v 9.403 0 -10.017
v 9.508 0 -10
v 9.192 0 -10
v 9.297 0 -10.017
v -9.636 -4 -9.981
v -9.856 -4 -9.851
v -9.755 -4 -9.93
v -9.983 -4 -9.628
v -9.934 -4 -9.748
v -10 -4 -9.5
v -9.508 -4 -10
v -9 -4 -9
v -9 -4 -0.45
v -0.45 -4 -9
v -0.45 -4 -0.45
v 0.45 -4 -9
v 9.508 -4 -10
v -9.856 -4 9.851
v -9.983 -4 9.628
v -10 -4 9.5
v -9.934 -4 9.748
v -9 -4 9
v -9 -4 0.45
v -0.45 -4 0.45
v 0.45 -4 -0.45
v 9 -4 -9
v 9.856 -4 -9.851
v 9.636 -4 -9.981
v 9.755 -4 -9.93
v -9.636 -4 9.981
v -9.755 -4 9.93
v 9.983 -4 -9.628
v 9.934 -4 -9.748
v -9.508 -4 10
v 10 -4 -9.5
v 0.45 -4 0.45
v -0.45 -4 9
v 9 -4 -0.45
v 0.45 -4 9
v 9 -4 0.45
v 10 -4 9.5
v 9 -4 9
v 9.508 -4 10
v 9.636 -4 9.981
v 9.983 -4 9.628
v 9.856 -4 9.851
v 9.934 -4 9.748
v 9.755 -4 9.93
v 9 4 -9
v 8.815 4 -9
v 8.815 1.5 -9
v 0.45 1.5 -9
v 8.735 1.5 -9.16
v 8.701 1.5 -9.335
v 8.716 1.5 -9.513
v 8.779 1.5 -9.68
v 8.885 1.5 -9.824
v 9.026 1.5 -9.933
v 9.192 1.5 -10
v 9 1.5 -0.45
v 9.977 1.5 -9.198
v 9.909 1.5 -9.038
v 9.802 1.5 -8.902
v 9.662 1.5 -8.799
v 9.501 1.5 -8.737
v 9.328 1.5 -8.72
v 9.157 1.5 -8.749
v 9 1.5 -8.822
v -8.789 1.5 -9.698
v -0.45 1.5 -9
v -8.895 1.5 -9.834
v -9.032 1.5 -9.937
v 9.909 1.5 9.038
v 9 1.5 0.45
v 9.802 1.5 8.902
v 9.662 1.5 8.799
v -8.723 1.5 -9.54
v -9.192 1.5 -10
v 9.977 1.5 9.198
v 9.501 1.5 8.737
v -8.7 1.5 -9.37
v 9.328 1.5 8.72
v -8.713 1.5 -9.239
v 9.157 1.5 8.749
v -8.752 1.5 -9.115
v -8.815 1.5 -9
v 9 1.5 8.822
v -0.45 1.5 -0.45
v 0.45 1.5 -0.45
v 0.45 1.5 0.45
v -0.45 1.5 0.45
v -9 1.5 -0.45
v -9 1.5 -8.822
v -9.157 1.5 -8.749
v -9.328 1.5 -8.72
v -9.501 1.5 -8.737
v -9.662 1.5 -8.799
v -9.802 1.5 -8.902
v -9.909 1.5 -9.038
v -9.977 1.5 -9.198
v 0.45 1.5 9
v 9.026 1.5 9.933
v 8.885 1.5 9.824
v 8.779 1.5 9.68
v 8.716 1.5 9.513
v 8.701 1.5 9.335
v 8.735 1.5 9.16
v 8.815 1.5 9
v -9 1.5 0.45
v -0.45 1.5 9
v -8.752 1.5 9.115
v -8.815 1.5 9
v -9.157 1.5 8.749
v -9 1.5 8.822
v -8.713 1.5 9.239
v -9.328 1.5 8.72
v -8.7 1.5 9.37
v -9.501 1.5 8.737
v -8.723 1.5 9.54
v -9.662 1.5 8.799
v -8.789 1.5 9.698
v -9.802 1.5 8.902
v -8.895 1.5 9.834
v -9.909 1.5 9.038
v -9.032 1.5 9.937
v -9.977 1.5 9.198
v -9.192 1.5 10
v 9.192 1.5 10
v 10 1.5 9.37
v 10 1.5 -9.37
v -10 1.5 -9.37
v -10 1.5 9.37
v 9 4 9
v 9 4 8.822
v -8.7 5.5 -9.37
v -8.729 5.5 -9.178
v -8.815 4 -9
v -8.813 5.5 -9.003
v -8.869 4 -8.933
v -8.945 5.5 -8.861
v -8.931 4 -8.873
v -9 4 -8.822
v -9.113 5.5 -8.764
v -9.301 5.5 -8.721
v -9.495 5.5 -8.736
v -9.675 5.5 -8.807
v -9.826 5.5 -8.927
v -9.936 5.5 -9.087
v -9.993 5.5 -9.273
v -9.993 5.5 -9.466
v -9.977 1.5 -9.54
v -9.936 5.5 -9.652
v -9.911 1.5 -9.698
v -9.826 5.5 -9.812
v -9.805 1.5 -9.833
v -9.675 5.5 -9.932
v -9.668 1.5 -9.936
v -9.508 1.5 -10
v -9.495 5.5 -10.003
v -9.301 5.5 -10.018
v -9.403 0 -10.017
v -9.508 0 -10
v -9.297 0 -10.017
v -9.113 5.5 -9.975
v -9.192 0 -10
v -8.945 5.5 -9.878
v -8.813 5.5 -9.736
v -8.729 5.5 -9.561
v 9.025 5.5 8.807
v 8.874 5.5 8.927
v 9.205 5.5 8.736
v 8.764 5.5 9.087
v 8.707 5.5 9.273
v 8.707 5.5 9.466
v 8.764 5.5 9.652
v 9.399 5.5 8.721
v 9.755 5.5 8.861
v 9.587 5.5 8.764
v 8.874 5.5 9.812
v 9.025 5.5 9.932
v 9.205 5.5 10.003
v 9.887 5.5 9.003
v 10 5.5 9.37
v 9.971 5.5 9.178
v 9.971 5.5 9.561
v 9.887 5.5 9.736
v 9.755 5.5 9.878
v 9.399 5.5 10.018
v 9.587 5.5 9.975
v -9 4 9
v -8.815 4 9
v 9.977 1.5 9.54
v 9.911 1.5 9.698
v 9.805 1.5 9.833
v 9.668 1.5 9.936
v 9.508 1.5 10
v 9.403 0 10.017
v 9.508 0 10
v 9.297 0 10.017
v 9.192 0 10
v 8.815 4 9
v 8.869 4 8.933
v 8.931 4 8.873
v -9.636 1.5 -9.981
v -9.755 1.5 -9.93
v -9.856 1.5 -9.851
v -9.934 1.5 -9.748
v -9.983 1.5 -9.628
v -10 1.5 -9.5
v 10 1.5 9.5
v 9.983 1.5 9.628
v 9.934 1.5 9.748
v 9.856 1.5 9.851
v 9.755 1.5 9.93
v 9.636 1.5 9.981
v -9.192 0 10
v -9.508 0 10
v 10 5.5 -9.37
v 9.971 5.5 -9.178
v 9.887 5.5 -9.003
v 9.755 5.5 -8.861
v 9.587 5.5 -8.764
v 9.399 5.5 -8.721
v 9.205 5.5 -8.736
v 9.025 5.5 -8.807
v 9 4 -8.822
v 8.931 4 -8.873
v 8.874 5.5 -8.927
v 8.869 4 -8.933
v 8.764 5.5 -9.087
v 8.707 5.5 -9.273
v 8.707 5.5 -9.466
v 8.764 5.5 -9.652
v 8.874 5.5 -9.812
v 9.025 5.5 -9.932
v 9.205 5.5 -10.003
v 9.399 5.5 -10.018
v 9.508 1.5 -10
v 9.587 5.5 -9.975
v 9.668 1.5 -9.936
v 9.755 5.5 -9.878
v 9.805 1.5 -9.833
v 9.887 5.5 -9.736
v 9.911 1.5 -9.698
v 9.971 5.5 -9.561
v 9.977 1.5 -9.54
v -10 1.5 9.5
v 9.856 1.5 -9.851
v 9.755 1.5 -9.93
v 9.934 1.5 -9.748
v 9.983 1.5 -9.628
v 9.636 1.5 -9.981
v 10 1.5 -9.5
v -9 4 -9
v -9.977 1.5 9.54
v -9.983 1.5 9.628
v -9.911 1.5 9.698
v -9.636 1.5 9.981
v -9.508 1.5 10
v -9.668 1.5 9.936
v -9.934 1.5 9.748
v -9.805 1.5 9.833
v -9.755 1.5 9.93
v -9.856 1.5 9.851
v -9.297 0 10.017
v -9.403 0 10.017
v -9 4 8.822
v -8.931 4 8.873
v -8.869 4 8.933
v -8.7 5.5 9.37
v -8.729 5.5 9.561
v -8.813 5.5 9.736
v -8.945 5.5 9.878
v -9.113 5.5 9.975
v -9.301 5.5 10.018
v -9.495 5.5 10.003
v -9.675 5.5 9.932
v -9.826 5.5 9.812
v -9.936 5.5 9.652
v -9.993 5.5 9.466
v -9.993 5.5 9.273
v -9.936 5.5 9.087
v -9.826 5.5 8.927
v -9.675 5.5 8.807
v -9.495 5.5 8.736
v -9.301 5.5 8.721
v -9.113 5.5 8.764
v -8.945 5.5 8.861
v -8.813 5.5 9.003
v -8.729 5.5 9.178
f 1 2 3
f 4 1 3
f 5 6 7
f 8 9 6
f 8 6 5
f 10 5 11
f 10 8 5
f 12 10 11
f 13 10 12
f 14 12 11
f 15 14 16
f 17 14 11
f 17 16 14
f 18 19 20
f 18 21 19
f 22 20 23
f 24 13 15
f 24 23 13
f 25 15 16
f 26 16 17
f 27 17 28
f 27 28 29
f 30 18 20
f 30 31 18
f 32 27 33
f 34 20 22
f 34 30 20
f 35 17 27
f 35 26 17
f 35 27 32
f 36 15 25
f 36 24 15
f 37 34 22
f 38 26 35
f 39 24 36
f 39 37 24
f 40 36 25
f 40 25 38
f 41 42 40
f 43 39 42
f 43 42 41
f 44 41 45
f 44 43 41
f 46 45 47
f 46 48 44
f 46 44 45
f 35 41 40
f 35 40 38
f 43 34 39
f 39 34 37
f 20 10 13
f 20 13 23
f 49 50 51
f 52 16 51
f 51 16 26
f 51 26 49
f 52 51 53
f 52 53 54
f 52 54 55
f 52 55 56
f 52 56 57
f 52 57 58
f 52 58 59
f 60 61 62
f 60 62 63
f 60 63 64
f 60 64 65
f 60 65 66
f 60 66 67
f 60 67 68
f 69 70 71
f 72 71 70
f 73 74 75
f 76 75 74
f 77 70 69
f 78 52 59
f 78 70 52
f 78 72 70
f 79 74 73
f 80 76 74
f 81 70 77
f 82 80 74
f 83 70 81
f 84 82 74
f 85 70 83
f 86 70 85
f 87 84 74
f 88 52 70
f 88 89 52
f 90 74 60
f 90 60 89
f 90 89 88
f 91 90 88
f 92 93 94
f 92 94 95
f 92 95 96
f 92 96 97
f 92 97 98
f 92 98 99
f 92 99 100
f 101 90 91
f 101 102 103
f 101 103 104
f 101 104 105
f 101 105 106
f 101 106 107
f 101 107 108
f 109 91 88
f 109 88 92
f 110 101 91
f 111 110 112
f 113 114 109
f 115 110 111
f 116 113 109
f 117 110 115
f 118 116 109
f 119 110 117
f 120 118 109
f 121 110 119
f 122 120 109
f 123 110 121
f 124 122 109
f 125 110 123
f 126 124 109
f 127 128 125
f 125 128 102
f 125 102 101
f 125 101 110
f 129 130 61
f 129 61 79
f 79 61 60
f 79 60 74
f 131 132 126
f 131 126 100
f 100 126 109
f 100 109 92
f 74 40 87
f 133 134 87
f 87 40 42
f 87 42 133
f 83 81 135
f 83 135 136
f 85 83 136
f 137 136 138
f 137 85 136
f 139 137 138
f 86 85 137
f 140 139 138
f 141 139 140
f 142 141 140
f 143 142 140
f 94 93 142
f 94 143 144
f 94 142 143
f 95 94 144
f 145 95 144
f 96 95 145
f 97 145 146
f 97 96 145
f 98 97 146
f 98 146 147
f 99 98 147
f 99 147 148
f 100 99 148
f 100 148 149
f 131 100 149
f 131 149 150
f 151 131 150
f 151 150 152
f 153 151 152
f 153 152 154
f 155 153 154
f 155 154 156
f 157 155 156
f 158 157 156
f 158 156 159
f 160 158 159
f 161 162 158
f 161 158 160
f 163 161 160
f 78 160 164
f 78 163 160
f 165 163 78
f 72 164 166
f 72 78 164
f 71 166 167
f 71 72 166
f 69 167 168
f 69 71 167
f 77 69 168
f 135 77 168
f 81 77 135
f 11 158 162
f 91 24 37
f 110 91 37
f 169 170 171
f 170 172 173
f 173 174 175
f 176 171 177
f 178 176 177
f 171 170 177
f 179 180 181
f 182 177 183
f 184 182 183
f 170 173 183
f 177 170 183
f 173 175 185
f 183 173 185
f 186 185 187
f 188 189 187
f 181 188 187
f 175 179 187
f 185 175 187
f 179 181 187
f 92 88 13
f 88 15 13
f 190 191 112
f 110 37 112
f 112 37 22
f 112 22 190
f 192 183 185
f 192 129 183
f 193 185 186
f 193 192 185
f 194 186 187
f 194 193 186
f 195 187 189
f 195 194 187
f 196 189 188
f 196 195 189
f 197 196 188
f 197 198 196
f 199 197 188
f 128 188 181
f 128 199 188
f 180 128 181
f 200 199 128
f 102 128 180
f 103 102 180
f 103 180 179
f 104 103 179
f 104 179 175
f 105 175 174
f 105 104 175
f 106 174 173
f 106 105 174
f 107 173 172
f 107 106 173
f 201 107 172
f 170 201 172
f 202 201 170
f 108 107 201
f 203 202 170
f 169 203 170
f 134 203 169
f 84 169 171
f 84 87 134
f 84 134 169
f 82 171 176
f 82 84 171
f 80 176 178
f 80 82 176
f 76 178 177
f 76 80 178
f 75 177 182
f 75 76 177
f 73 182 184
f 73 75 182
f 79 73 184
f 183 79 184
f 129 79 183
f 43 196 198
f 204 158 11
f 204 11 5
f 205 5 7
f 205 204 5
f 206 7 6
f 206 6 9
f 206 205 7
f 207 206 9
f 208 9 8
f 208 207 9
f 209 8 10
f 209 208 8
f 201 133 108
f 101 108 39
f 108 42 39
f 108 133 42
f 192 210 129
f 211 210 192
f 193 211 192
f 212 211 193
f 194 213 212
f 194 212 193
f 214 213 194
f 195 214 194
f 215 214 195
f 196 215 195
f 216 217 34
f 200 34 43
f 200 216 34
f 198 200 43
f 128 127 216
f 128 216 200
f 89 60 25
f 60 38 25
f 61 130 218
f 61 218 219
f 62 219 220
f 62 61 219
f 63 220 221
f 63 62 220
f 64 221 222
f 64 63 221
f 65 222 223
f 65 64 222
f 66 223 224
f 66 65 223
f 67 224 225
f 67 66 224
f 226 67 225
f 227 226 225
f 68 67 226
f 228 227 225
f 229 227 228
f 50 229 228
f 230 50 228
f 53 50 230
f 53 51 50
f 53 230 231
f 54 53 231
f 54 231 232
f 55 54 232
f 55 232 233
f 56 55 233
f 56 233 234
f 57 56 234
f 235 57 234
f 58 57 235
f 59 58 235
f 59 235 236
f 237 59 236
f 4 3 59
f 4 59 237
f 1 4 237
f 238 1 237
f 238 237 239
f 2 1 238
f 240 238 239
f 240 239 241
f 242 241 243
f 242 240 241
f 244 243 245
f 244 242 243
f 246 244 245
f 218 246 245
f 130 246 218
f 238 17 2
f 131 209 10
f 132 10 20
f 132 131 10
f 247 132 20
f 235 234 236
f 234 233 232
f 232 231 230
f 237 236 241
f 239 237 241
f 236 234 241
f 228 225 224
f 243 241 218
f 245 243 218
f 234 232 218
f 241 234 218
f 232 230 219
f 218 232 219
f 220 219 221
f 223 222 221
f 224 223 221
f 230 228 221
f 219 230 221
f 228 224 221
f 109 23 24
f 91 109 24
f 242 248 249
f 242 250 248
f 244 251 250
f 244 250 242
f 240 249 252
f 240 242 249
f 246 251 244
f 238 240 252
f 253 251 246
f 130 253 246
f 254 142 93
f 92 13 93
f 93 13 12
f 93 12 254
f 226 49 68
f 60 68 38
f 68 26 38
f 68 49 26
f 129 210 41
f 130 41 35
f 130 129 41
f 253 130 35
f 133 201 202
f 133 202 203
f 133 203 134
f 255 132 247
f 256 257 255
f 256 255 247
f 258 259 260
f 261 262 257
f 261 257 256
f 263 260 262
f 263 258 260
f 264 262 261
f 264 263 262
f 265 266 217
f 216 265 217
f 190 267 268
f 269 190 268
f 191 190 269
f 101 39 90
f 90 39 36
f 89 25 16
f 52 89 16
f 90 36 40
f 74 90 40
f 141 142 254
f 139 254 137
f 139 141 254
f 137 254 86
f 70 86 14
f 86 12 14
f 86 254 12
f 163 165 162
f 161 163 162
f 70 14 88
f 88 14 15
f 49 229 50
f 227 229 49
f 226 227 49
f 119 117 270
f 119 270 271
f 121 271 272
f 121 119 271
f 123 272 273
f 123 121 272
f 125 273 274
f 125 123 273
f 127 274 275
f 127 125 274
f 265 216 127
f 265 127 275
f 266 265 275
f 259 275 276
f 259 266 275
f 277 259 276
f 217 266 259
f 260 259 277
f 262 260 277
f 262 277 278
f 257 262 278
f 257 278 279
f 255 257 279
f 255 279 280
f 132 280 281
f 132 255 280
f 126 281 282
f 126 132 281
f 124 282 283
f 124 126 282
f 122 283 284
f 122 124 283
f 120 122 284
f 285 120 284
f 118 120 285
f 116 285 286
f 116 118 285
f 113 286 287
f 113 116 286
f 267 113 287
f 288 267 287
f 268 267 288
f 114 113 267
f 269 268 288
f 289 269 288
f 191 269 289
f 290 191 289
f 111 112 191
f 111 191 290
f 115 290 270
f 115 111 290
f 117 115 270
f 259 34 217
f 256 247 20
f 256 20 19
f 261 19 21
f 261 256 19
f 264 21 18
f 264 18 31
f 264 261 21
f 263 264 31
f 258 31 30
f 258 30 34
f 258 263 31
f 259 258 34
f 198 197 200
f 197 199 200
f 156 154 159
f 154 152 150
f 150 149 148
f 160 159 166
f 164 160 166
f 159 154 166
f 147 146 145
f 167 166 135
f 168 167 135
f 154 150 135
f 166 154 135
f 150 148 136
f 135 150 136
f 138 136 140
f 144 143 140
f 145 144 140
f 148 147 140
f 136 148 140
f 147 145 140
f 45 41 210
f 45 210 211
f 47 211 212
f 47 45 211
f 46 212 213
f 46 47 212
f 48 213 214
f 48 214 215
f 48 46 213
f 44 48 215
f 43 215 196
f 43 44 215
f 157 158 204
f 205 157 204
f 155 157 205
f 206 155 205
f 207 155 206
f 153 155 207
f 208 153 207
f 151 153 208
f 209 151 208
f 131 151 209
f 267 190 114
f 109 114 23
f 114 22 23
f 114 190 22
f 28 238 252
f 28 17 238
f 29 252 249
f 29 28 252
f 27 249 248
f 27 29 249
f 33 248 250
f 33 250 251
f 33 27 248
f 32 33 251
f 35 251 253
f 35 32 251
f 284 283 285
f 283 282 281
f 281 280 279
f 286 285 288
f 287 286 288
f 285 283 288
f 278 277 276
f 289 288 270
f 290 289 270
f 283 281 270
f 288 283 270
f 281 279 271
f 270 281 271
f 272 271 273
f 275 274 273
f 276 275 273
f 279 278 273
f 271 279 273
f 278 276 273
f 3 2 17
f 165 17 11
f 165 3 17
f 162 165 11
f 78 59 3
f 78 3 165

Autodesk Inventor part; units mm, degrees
ref_plane "YZ Plane" through (0, 0, 0) normal (1, 0, 0) x (0, 1, 0)
ref_plane "XZ Plane" through (0, 0, 0) normal (0, 1, 0) x (-1, 0, 0)
ref_plane "XY Plane" through (0, 0, 0) normal (0, 0, 1) x (1, 0, 0)
sketch "Sketch1" plane through (0, 0, 0) normal (0, 1, 0) x (-1, 0, 0)
  line L0 (-9.35, 9.3695) -> (9.35, 9.3695) construction
  line L1 (9.35, 9.3695) -> (9.35, -9.3695) construction
  line L2 (9.35, -9.3695) -> (-9.35, -9.3695) construction
  line L3 (-9.35, -9.3695) -> (-9.35, 9.3695) construction
  line L4 (-9.35, 9.3695) -> (9.35, -9.3695) construction
  line L5 (9.35, 9.3695) -> (-9.35, -9.3695) construction
  line L6 (-10, 10) -> (10, 10)
  line L7 (10, 10) -> (10, -10)
  line L8 (10, -10) -> (-10, -10)
  line L9 (-10, -10) -> (-10, 10)
  line L10 (-10, 10) -> (10, -10) construction
  line L11 (10, 10) -> (-10, -10) construction
  point P0 (0, 0)
  dimension "d0" = 18.739
  dimension "d1" = 18.7
  dimension "d2" = 20
  dimension "d3" = 20
extrude "Extrusion1" add sketch "Sketch1" along normal blind 1.5
sketch "Sketch2" plane through (0, 0, 0) normal (0, -1, 0) x (1, 0, 0)
  line L0 (-9.35, 9.3695) -> (9.35, 9.3695) construction
  line L1 (9.35, 9.3695) -> (9.35, -9.3695) construction
  line L2 (9.35, -9.3695) -> (-9.35, -9.3695) construction
  line L3 (-9.35, -9.3695) -> (-9.35, 9.3695) construction
  line L4 (-9.35, 9.3695) -> (9.35, -9.3695) construction
  line L5 (9.35, 9.3695) -> (-9.35, -9.3695) construction
  circle A0 centre (9.35, 9.3695) radius 0.65
  circle A1 centre (-9.35, 9.3695) radius 0.65
  line L6 (-10, -10) -> (-10, 10) projected
  circle A2 centre (9.35, -9.3695) radius 0.65
  circle A3 centre (-9.35, -9.3695) radius 0.65
  point P0 (0, 0)
  dimension "d6" = 1.3
  dimension "d7" = 18.739
  dimension "d8" = 18.7
  dimension "d9" = 1.3
  dimension "d11" = 1.3
  dimension "d12" = 1.3
extrude "Extrusion2" add sketch "Sketch2" against normal blind 5.5
sketch "Sketch3" plane through (0, 0, 0) normal (0, -1, 0) x (1, 0, 0)
  line L0 (-10, 10) -> (10, 10) projected
  line L1 (10, -10) -> (-10, -10)
  line L2 (-10, -10) -> (-10, 10)
  line L3 (-10, 10) -> (10, 10)
  line L4 (10, 10) -> (10, -10)
  line L5 (10, -10) -> (-10, 10) construction
  line L6 (-10, -10) -> (10, 10) construction
  line L7 (9, -9) -> (-9, -9)
  line L8 (-9, -9) -> (-9, 9)
  line L9 (-9, 9) -> (9, 9)
  line L10 (9, 9) -> (9, -9)
  line L11 (9, -9) -> (-9, 9) construction
  line L12 (-9, -9) -> (9, 9) construction
  point P0 (0, 0)
  dimension "d15" = 1
  dimension "d16" = 1
extrude "Extrusion3" add sketch "Sketch3" along normal blind 4
sketch "Sketch4" plane through (0, 0, 0) normal (0, -1, 0) x (1, 0, 0)
  line L0 (-9, 9) -> (-9, -9) projected
  line L1 (9, -0.45) -> (-9, -0.45)
  line L2 (-9, -0.45) -> (-9, 0.45)
  line L3 (-9, 0.45) -> (9, 0.45)
  line L4 (9, 0.45) -> (9, -0.45)
  line L5 (9, -0.45) -> (-9, 0.45) construction
  line L6 (-9, -0.45) -> (9, 0.45) construction
  line L7 (-9, -9) -> (9, -9) projected
  line L8 (0.45, 9) -> (-0.45, 9)
  line L9 (-0.45, 9) -> (-0.45, -9)
  line L10 (-0.45, -9) -> (0.45, -9)
  line L11 (0.45, -9) -> (0.45, 9)
  line L12 (0.45, 9) -> (-0.45, -9) construction
  line L13 (-0.45, 9) -> (0.45, -9) construction
  point P0 (0, 0)
  point P1 (-9, 8.8822)
  point P2 (-9, -8.8822)
  point P3 (-8.8773, -9)
  point P4 (8.8773, -9)
  point P5 (0.45, -0.45)
  point P6 (0.45, 0.45)
  point P7 (-0.45, 0.45)
  point P8 (-0.45, -0.45)
  dimension "d19" = 0.9
  dimension "d20" = 0.9
extrude "Extrusion4" add sketch "Sketch4" along normal blind 4 contours L3 L9 L1 L0 | L9 L8 L11 L3 | L3 L11 L1 L9 | L1 L11 L7 L9 | L3 L4 L1 L11
fillet "Fillet1" radius 0.5 4 edges at (10, -1.25, 10) (-10, -1.25, 10) (10, -1.25, -10) (-10, -1.25, -10)
sketch "Sketch5" plane through (0, 0, 0) normal (0, -1, 0) x (1, 0, 0)
  line L0 (-9, -9) -> (-0.45, -9) projected
  line L1 (-0.45, -9) -> (-0.45, -0.45) projected
  line L2 (-9, -9) -> (-0.45, -9)
  line L3 (-0.45, -9) -> (-0.45, -0.45)
  line L4 (-0.45, -0.45) -> (-9, -0.45)
  line L5 (-9, -0.45) -> (-9, -9)
  line L6 (-9, 0.45) -> (-0.45, 0.45) projected
  line L7 (-0.45, 9) -> (-9, 9) projected
  line L8 (-9, 0.45) -> (-0.45, 0.45)
  line L9 (-0.45, 0.45) -> (-0.45, 9)
  line L10 (-0.45, 9) -> (-9, 9)
  line L11 (-9, 9) -> (-9, 0.45)
  line L12 (0.45, -9) -> (9, -9) projected
  line L13 (9, -9) -> (9, -0.45) projected
  line L14 (0.45, -9) -> (9, -9)
  line L15 (9, -9) -> (9, -0.45)
  line L16 (9, -0.45) -> (0.45, -0.45)
  line L17 (0.45, -0.45) -> (0.45, -9)
  line L18 (0.45, 0.45) -> (9, 0.45) projected
  line L19 (9, 0.45) -> (9, 9) projected
  line L20 (0.45, 0.45) -> (9, 0.45)
  line L21 (9, 0.45) -> (9, 9)
  line L22 (9, 9) -> (0.45, 9)
  line L23 (0.45, 9) -> (0.45, 0.45)
  point P0 (0, 0)
  point P1 (-0.45, 0.45)
extrude "Extrusion5" cut sketch "Sketch5" against normal blind 4
properties part number "skirt"
